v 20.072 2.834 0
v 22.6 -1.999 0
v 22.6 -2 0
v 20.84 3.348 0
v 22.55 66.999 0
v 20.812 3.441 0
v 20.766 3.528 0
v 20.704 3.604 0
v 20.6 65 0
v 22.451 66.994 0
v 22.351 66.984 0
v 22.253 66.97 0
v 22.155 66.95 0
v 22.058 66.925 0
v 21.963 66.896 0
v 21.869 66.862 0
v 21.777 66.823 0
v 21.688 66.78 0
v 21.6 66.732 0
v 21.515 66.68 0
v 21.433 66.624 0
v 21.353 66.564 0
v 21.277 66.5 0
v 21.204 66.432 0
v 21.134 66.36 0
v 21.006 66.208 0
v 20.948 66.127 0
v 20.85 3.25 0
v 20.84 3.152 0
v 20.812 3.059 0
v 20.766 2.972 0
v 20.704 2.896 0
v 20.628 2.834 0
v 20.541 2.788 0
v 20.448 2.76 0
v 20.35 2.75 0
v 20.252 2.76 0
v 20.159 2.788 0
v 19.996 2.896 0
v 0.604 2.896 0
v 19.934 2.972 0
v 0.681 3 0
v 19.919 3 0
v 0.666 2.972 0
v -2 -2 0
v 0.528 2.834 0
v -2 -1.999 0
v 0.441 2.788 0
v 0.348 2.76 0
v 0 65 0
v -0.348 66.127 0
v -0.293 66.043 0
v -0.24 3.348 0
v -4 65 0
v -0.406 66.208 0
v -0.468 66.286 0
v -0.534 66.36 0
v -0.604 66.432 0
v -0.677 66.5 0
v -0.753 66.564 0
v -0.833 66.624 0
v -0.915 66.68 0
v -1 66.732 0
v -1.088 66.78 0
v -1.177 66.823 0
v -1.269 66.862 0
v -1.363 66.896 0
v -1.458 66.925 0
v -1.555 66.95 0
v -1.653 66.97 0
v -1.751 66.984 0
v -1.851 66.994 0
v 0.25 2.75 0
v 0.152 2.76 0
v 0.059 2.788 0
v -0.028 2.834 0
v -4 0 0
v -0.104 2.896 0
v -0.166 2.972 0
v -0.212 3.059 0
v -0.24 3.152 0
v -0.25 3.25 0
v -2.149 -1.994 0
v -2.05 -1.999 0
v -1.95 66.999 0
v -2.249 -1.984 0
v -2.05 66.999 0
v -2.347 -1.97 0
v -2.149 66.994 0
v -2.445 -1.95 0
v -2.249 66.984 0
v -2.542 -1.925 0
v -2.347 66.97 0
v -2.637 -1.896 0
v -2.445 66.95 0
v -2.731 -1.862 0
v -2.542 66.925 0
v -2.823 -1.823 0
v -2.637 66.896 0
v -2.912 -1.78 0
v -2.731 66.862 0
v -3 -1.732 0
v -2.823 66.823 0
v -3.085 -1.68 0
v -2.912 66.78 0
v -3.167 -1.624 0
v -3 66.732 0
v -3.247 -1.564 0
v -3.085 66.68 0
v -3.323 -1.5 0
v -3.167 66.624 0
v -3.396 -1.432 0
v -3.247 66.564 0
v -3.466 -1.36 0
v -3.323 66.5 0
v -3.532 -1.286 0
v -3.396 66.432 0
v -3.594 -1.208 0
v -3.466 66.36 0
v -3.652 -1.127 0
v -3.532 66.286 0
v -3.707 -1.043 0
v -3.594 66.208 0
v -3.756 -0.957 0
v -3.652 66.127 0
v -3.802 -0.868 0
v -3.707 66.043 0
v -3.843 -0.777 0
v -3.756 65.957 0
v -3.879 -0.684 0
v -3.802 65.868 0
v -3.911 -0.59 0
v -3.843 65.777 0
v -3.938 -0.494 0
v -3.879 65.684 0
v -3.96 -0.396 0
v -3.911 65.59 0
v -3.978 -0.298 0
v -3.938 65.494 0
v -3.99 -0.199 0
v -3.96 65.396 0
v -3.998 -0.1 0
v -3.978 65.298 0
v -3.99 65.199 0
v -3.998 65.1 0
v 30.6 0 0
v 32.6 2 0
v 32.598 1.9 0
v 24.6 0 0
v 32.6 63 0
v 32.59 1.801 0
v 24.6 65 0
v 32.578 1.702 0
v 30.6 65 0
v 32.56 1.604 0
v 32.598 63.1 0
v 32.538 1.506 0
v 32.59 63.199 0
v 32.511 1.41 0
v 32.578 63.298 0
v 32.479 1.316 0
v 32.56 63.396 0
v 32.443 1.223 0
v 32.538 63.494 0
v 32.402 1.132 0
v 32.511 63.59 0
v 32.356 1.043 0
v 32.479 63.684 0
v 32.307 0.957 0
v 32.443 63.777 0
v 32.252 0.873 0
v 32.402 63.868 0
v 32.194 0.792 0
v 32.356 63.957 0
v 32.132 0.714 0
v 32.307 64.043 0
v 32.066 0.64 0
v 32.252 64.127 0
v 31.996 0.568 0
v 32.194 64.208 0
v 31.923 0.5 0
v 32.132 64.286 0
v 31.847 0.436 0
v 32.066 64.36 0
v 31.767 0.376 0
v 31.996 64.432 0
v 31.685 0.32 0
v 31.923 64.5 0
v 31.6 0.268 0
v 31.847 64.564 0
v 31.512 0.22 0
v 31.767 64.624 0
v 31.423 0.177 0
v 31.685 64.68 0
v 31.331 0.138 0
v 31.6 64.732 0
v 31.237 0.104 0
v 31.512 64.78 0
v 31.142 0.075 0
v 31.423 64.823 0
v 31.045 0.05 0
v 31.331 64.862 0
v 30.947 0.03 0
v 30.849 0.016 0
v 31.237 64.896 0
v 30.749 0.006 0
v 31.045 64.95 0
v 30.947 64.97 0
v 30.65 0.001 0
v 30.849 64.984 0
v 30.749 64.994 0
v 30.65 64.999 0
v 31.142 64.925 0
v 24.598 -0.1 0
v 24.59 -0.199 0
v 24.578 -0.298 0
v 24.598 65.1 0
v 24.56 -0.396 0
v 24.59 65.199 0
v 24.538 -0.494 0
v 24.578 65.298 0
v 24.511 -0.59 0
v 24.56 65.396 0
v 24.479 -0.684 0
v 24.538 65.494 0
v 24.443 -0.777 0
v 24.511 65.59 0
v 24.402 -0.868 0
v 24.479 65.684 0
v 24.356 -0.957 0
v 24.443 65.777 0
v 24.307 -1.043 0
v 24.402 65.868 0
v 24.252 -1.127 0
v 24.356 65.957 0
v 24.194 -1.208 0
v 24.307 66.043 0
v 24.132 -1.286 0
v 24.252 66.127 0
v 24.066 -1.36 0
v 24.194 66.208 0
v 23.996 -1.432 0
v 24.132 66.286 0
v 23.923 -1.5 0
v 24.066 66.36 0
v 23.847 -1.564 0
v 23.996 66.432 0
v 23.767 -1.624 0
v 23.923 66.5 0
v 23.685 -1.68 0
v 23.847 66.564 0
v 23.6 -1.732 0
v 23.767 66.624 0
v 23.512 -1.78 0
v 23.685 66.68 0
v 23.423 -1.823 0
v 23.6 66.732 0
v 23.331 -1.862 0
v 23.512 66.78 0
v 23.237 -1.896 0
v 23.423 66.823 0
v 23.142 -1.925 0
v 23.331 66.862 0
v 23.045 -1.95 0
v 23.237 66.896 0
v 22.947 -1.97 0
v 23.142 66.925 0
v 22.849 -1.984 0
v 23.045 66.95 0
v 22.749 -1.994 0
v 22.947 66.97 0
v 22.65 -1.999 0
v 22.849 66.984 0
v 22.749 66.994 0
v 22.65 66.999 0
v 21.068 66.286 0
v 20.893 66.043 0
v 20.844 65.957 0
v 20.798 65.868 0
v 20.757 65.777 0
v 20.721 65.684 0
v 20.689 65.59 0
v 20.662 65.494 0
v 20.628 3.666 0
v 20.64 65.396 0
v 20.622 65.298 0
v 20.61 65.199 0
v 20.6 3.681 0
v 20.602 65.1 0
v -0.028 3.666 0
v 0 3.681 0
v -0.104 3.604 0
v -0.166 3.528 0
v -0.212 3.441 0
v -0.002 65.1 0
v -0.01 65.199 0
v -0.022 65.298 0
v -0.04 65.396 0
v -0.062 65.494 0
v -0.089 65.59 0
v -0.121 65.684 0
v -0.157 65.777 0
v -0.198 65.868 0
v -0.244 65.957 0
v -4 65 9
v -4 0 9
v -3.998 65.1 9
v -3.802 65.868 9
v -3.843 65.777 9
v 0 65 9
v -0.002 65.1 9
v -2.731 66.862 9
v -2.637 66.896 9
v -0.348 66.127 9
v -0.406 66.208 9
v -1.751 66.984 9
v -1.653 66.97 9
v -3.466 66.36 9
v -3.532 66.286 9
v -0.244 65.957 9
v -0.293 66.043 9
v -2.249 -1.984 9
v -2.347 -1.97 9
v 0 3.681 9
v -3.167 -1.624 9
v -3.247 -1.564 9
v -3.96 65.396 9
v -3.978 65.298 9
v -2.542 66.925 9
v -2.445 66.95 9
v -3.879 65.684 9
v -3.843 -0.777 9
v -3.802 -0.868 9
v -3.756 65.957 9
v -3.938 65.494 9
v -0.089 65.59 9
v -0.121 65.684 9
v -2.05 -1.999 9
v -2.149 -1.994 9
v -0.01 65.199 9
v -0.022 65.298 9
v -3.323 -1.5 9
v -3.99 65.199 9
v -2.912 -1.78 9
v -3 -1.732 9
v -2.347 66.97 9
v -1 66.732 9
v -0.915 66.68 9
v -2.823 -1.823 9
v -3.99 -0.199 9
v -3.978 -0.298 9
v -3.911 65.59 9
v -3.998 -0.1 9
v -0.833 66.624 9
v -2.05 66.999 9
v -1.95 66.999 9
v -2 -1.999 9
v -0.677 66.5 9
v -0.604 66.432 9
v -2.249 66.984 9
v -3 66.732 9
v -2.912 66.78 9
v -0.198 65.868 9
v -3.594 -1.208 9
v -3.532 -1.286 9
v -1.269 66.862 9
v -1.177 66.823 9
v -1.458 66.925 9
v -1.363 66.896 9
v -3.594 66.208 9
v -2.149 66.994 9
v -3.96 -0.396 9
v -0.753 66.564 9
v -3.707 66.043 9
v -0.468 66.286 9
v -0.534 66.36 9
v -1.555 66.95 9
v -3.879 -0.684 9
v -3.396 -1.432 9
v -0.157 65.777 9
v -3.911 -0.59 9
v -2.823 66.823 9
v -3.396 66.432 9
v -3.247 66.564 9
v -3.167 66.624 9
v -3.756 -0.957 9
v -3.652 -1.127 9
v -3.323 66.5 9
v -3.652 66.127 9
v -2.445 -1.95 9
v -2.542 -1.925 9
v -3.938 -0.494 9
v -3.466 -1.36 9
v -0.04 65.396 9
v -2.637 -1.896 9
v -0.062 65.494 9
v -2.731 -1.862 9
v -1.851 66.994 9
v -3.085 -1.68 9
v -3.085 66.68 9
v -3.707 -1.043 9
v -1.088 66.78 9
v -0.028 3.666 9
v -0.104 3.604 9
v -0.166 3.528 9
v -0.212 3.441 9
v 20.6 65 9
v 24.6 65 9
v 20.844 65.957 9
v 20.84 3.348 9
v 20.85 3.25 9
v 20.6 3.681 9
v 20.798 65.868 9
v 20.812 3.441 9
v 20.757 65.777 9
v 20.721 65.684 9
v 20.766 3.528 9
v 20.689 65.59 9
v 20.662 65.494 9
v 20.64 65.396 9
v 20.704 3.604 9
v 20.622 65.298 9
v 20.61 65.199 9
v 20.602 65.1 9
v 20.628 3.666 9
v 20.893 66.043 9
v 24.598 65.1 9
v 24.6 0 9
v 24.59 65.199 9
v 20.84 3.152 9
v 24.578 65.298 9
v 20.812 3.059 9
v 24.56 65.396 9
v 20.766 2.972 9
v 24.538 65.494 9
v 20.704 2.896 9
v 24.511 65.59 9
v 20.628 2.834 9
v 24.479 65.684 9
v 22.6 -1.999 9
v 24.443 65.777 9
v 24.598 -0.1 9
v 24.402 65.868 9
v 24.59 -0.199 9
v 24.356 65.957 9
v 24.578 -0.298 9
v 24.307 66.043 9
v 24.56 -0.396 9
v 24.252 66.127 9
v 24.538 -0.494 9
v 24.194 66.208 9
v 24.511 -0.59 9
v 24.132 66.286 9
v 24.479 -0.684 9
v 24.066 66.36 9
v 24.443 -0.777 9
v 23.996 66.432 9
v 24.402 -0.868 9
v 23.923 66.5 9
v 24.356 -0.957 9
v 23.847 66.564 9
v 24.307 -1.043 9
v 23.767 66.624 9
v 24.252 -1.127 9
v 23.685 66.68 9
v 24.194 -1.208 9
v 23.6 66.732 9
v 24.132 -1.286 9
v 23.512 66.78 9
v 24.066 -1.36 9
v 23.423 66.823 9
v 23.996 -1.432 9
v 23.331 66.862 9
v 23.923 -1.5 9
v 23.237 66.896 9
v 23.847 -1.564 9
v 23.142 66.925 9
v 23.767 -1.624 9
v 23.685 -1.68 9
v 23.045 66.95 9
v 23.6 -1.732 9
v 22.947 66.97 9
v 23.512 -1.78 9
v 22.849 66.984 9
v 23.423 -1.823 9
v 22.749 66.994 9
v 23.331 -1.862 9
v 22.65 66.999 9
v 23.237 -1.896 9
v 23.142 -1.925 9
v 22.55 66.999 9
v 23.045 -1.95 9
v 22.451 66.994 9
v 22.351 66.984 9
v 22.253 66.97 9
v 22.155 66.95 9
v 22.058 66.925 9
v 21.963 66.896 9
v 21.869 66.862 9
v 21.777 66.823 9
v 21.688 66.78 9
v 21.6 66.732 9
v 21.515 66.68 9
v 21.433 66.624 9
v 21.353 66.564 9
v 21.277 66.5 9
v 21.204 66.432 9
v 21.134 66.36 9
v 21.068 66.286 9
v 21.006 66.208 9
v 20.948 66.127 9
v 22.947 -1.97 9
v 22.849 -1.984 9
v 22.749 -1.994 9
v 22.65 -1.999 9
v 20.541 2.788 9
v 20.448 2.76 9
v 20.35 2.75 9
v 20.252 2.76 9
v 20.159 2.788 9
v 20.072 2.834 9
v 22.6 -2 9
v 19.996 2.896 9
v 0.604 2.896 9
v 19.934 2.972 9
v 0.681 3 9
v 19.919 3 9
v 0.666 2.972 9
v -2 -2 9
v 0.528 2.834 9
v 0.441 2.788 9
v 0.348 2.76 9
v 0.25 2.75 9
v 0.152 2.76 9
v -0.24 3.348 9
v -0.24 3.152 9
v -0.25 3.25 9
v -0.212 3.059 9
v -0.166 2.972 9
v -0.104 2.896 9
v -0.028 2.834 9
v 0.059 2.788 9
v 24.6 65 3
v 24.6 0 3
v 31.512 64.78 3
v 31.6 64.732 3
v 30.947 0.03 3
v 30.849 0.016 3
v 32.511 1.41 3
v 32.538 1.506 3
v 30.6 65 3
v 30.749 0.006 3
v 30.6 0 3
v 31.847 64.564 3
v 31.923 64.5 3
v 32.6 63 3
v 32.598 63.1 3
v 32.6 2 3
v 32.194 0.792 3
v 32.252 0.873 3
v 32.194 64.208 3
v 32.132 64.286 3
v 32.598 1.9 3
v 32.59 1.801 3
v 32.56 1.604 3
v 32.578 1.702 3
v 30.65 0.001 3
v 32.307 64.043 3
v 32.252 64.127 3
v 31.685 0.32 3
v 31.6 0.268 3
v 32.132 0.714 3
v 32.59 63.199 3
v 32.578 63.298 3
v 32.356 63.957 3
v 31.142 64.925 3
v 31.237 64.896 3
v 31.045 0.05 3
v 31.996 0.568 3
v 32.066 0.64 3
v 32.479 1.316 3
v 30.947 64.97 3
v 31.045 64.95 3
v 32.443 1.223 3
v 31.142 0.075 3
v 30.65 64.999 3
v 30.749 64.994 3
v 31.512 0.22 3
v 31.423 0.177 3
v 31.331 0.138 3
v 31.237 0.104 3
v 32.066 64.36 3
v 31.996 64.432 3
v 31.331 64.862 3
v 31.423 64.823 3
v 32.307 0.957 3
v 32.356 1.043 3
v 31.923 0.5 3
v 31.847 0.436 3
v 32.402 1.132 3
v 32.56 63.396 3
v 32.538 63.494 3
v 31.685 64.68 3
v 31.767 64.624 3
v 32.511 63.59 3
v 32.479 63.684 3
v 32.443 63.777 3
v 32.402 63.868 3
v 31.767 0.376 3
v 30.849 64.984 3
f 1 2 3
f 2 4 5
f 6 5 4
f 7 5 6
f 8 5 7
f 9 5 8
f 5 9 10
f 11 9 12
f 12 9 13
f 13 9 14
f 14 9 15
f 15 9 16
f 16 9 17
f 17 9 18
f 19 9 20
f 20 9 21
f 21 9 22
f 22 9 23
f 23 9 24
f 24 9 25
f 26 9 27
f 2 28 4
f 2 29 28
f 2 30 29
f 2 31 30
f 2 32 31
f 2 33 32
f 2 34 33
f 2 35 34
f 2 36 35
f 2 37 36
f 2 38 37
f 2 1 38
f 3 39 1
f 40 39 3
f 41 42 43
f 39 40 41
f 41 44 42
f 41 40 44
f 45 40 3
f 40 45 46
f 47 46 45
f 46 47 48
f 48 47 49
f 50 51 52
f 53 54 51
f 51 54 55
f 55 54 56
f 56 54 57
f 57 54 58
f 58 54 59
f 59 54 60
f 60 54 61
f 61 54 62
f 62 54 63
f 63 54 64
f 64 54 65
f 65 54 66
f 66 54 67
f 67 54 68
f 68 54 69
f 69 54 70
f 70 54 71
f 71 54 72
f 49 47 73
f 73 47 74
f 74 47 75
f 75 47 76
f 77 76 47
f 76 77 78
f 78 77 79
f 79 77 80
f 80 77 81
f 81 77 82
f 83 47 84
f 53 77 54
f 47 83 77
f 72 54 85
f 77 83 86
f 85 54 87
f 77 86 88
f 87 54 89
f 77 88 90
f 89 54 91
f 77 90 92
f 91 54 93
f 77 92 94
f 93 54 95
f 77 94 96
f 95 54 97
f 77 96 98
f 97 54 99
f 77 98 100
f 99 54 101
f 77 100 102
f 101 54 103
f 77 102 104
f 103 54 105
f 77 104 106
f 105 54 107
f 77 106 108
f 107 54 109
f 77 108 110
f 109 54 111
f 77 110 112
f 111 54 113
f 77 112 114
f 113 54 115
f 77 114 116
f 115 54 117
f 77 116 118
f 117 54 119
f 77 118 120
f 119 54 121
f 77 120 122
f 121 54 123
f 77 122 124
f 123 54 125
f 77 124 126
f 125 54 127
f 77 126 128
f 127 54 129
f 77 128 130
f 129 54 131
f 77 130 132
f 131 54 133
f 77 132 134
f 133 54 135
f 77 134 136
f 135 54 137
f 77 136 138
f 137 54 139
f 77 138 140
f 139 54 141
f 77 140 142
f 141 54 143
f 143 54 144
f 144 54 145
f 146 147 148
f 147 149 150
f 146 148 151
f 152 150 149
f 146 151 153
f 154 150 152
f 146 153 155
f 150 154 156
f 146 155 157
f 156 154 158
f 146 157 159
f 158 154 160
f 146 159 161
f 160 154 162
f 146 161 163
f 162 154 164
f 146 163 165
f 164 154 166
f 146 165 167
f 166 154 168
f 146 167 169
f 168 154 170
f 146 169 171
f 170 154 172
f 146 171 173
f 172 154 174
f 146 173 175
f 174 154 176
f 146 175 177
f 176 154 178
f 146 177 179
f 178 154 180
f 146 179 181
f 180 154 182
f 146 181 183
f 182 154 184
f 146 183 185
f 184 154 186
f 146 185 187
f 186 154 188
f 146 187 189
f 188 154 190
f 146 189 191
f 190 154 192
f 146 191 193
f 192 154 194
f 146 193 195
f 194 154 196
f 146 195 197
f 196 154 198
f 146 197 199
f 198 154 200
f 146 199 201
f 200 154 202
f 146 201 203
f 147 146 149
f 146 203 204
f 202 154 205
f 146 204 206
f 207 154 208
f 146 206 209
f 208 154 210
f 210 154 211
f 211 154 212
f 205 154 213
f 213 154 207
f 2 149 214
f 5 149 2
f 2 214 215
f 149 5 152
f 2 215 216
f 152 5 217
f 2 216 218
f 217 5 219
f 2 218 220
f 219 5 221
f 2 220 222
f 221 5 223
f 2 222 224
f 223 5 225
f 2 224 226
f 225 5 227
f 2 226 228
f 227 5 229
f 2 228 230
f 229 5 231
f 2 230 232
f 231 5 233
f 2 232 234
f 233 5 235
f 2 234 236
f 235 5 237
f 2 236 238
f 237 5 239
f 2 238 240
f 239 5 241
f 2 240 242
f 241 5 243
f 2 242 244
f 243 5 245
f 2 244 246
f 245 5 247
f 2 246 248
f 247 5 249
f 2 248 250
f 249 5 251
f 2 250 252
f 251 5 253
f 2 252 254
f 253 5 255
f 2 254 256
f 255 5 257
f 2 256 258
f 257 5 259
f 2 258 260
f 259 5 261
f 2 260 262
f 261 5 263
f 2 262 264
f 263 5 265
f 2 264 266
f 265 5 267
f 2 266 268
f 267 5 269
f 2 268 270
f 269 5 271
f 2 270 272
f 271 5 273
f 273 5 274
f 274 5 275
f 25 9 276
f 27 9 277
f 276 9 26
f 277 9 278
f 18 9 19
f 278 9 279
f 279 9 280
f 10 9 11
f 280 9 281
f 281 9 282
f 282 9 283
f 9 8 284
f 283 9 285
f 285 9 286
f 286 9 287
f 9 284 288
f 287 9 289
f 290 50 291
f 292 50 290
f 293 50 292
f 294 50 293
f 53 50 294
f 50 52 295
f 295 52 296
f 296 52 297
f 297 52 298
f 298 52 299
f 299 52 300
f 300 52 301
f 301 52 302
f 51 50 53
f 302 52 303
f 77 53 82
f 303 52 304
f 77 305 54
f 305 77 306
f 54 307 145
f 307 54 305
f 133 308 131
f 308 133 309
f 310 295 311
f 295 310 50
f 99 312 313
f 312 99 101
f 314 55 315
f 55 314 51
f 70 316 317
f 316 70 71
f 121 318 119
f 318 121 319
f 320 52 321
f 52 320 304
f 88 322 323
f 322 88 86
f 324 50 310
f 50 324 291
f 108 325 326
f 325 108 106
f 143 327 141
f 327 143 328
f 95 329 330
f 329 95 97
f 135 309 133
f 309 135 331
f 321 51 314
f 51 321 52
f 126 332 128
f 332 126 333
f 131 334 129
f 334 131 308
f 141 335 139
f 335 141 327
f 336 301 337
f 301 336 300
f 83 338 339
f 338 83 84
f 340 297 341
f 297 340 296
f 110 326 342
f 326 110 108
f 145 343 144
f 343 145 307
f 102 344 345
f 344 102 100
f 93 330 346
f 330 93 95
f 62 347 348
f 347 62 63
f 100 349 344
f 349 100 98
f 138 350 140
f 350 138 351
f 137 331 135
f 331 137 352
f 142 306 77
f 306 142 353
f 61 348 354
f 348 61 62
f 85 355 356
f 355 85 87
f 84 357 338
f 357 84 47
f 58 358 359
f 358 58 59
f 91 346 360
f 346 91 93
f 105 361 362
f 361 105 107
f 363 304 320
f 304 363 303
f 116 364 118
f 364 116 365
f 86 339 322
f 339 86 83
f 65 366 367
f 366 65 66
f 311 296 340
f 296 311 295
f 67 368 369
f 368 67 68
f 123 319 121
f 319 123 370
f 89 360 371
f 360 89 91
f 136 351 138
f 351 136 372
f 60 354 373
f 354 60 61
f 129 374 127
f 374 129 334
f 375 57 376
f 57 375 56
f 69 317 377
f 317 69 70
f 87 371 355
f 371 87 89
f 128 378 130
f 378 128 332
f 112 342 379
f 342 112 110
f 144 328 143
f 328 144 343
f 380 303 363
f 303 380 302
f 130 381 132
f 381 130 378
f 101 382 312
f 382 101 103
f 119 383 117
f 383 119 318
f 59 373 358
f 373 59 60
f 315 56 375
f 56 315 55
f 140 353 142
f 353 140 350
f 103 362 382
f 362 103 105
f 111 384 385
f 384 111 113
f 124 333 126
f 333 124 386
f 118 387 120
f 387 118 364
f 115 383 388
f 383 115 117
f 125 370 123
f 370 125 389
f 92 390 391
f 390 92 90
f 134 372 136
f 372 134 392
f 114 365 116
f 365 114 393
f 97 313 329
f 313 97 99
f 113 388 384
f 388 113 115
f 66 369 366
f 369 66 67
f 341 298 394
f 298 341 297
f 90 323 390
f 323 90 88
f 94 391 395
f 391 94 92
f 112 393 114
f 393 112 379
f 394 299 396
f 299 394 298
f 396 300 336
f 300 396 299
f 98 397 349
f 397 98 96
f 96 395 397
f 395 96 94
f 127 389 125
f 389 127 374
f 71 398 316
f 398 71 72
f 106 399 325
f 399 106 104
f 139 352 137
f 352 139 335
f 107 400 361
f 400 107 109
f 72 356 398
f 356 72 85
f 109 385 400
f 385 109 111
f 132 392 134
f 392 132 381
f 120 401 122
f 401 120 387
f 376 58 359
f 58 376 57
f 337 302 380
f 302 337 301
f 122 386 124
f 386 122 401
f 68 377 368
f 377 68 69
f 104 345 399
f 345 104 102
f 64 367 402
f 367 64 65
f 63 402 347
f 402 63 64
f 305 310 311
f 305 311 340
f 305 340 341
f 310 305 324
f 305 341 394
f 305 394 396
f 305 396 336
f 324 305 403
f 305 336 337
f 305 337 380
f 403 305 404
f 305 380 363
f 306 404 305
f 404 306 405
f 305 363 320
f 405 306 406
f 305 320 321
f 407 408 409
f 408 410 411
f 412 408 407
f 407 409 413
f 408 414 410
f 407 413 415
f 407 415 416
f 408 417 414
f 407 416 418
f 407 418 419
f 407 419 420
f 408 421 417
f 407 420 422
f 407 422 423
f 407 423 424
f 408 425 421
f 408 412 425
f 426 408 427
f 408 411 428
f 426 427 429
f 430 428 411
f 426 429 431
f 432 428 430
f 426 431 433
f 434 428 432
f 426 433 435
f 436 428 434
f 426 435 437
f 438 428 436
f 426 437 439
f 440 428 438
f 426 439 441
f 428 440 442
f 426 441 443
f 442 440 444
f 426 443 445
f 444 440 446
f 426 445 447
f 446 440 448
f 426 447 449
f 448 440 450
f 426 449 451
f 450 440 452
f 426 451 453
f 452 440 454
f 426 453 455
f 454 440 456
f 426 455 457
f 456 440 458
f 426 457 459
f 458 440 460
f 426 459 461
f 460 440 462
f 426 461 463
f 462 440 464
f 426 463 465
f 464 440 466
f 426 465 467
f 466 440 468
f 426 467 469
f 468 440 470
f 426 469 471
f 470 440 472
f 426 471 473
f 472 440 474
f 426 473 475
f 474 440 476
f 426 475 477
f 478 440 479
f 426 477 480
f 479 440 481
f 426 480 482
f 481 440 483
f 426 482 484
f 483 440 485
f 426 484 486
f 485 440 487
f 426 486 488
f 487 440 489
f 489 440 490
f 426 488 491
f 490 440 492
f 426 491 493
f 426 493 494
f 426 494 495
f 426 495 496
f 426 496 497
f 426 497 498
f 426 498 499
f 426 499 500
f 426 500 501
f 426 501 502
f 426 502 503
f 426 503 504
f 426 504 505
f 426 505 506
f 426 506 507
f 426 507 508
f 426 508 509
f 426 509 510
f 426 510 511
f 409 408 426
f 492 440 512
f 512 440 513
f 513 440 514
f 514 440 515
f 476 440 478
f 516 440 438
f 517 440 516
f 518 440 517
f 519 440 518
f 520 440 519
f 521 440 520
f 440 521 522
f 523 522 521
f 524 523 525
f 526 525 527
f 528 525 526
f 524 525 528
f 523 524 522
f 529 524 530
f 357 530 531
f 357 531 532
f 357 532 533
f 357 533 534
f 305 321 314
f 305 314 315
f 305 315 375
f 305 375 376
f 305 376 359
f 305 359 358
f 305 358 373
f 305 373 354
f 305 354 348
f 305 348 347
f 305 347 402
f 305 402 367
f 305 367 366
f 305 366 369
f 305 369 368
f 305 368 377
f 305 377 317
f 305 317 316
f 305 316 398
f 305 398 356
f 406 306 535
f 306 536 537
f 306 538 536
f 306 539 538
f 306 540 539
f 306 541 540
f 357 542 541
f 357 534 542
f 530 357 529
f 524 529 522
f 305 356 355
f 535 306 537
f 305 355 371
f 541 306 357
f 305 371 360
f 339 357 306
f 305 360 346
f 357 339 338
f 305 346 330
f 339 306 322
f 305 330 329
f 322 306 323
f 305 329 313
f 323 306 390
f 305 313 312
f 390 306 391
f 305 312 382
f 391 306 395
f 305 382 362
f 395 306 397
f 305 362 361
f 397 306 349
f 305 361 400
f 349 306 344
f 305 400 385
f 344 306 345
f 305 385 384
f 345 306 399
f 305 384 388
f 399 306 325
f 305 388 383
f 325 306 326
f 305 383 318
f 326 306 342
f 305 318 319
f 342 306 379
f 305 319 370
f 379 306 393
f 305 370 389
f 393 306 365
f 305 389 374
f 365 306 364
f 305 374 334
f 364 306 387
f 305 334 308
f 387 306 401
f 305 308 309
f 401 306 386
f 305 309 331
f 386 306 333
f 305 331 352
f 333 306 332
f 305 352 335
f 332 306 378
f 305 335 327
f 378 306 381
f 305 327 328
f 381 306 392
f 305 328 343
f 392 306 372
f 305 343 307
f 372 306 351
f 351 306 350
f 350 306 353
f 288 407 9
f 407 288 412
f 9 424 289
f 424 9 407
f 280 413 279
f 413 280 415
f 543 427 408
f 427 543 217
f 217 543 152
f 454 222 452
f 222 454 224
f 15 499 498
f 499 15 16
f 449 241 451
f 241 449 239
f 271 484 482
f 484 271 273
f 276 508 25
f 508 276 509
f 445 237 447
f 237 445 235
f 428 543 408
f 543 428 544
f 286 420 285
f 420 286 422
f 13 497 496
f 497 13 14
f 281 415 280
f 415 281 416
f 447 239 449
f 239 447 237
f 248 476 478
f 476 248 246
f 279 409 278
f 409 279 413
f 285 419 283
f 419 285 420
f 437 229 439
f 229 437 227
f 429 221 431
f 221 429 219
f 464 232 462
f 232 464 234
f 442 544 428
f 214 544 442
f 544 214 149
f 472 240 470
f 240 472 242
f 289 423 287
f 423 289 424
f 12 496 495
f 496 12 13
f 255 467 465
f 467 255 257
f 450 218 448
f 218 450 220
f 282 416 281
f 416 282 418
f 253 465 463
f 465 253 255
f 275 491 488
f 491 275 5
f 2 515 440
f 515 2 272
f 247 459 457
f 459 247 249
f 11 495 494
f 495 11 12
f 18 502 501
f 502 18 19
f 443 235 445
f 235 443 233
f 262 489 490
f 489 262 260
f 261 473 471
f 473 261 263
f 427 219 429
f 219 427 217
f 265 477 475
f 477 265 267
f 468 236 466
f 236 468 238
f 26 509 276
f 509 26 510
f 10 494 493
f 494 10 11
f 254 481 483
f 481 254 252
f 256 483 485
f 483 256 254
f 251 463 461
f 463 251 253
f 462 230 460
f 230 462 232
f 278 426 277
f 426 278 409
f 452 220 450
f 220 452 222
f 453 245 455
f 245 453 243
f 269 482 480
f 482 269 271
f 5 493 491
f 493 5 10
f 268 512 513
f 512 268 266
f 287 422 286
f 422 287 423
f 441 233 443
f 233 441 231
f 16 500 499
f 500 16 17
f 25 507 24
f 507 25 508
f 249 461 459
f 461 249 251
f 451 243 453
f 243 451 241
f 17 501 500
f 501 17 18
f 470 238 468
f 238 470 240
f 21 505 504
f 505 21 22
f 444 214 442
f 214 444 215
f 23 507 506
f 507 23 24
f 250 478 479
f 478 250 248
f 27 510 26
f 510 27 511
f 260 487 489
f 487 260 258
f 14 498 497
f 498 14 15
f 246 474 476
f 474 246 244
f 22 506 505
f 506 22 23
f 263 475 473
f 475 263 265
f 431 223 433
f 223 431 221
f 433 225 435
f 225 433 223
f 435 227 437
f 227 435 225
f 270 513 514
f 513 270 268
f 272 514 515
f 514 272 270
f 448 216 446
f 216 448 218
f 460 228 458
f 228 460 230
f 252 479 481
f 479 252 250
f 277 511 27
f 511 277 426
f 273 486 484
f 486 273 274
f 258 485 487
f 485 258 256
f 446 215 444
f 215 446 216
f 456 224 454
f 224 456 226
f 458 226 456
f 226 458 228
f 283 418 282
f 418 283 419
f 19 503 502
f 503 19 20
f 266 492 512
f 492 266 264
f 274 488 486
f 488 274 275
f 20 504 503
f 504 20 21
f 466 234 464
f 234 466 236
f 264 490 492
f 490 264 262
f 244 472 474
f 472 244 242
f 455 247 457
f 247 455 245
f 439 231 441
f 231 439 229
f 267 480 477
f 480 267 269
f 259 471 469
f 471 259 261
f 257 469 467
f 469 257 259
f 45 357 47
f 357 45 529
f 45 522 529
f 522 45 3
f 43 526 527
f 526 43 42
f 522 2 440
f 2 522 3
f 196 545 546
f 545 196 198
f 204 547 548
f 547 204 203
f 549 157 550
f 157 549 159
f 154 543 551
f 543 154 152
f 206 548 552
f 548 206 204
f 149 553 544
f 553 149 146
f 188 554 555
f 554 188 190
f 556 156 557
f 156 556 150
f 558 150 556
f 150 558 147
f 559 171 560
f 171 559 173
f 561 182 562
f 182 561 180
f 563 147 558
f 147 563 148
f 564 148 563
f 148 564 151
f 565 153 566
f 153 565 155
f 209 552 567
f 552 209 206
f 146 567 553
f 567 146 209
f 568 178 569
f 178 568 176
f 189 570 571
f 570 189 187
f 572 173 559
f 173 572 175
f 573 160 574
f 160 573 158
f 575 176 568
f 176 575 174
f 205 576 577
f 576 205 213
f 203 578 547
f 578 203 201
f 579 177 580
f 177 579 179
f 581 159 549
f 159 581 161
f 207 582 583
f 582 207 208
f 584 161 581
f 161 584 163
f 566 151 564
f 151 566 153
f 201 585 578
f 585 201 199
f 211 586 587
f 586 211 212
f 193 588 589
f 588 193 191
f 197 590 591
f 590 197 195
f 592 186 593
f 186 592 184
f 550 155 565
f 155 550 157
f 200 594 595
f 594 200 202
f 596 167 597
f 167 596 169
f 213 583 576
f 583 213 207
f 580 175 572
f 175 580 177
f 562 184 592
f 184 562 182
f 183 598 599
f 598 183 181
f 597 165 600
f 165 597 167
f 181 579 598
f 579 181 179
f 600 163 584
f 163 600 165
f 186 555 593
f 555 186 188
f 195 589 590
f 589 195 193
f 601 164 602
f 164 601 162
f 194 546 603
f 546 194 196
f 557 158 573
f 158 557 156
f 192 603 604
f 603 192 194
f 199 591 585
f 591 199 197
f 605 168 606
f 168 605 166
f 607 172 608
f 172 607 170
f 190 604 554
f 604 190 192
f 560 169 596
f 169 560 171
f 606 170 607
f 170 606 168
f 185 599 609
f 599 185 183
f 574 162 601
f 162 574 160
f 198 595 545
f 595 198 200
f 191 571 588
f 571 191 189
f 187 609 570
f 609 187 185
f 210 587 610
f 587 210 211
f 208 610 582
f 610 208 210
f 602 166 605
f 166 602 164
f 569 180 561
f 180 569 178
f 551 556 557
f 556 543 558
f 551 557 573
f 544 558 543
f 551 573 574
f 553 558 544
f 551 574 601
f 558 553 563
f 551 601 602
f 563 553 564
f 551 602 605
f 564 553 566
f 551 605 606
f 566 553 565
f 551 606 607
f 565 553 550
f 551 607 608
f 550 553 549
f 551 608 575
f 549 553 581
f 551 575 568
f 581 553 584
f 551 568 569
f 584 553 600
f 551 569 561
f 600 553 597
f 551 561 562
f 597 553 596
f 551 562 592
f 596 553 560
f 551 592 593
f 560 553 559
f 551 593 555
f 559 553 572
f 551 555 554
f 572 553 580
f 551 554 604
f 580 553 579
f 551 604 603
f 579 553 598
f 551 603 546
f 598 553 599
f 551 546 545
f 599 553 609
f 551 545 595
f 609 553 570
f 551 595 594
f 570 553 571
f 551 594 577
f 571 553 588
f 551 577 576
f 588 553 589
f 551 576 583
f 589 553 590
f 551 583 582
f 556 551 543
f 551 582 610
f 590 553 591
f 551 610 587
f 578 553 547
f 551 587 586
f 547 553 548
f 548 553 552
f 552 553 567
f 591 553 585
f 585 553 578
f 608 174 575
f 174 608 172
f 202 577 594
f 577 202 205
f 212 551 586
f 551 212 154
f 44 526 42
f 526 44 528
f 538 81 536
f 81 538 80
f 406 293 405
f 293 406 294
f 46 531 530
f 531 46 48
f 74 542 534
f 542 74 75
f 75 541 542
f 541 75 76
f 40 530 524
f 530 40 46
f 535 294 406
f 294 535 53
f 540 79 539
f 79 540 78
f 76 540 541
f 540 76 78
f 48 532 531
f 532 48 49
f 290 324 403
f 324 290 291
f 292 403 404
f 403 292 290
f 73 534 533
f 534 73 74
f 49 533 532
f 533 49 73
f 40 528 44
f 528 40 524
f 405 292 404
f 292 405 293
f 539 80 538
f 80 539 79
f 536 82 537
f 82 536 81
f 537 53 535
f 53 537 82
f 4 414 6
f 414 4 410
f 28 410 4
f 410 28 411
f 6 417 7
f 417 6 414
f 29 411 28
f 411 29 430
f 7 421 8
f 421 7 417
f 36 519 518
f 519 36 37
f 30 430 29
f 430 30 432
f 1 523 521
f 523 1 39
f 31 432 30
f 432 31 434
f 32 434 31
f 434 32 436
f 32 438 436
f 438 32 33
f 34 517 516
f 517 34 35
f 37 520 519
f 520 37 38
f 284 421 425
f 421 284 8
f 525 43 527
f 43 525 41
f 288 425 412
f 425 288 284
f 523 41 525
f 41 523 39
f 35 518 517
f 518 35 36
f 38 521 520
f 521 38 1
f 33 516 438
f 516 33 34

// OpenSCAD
// Minimum render angle
$fa = 1;
// Minimum render size
$fs = 0.1;

// Top shelf: 20.6
// Bottom shelves: 19.1

shelf_Thickness		= 20.6;

arm_Height			= 4;
arm_Width			= 9;
arm_Reach			= 65;

fin_Height = 8;
//
fin_Thickness = 3;

back_Thickness = 5;

difference()
{
	{
		union()
		{
			arms();
			back();
			// fin();
			opposing_fin();
		}
	}
	{
		corner_relief();
	}
}



module opposing_fin()
{
	translate( [shelf_Thickness, 0, fin_Thickness] ) rotate( [0, 180, 0] ) fin();
}

module corner_relief()
{
	translate( [0, back_Thickness - arm_Height/2, -1] ){
		translate( [0.25, 0.25, 0] ) cylinder( d = 1, h = arm_Width + 2 );
		translate( [shelf_Thickness - 0.25, 0.25, 0] ) cylinder( d = 1, h = arm_Width + 2 );
	}
}


module fin()
{
	hull()
	{
		{
			translate( [(-1 * fin_Height) - arm_Height/2, 0, 0] ) cube( [fin_Height, arm_Reach, fin_Thickness] );
		}
		{
			translate( [(-1 * fin_Height) - (arm_Height/2), arm_Height/2, 0] )
			{
				cylinder( d = arm_Height, h = fin_Thickness );
				translate( [0, arm_Reach - arm_Height, 0] ) cylinder( d = arm_Height, h = fin_Thickness );
			}
		}
	}
}


// %translate( [(-1 * fin_Height) - arm_Height, 0, 0] ) cube( [fin_Height - (arm_Height/2), arm_Reach, fin_Thickness] );

module back()
{
	hull()
	{
		{}
		{
			translate( [0, -1 * (arm_Height/2), 0] )
			{
				translate( [(-1 * (arm_Height/2)), 0, 0] ) cube( [arm_Height, back_Thickness, arm_Width] );
				translate( [shelf_Thickness - (arm_Height/2), 0, 0] ) cube( [arm_Height, back_Thickness, arm_Width] );
			}
		}
	}

}

module arms()
{
	arm();
	// translate( [0, 0, 6] ) arm();
	translate( [shelf_Thickness + arm_Height, 0, 0] ) arm();
}

module arm()
{
	translate( [-1 * (arm_Height/2), 0, 0] )
	{
		hull()
		{
			{}
			{
				union()
				{
					cylinder( d = arm_Height, h = arm_Width );
					translate( [0, arm_Reach, 0] ) cylinder( d = arm_Height, h = arm_Width );
				}
			}
		}
	}
}
